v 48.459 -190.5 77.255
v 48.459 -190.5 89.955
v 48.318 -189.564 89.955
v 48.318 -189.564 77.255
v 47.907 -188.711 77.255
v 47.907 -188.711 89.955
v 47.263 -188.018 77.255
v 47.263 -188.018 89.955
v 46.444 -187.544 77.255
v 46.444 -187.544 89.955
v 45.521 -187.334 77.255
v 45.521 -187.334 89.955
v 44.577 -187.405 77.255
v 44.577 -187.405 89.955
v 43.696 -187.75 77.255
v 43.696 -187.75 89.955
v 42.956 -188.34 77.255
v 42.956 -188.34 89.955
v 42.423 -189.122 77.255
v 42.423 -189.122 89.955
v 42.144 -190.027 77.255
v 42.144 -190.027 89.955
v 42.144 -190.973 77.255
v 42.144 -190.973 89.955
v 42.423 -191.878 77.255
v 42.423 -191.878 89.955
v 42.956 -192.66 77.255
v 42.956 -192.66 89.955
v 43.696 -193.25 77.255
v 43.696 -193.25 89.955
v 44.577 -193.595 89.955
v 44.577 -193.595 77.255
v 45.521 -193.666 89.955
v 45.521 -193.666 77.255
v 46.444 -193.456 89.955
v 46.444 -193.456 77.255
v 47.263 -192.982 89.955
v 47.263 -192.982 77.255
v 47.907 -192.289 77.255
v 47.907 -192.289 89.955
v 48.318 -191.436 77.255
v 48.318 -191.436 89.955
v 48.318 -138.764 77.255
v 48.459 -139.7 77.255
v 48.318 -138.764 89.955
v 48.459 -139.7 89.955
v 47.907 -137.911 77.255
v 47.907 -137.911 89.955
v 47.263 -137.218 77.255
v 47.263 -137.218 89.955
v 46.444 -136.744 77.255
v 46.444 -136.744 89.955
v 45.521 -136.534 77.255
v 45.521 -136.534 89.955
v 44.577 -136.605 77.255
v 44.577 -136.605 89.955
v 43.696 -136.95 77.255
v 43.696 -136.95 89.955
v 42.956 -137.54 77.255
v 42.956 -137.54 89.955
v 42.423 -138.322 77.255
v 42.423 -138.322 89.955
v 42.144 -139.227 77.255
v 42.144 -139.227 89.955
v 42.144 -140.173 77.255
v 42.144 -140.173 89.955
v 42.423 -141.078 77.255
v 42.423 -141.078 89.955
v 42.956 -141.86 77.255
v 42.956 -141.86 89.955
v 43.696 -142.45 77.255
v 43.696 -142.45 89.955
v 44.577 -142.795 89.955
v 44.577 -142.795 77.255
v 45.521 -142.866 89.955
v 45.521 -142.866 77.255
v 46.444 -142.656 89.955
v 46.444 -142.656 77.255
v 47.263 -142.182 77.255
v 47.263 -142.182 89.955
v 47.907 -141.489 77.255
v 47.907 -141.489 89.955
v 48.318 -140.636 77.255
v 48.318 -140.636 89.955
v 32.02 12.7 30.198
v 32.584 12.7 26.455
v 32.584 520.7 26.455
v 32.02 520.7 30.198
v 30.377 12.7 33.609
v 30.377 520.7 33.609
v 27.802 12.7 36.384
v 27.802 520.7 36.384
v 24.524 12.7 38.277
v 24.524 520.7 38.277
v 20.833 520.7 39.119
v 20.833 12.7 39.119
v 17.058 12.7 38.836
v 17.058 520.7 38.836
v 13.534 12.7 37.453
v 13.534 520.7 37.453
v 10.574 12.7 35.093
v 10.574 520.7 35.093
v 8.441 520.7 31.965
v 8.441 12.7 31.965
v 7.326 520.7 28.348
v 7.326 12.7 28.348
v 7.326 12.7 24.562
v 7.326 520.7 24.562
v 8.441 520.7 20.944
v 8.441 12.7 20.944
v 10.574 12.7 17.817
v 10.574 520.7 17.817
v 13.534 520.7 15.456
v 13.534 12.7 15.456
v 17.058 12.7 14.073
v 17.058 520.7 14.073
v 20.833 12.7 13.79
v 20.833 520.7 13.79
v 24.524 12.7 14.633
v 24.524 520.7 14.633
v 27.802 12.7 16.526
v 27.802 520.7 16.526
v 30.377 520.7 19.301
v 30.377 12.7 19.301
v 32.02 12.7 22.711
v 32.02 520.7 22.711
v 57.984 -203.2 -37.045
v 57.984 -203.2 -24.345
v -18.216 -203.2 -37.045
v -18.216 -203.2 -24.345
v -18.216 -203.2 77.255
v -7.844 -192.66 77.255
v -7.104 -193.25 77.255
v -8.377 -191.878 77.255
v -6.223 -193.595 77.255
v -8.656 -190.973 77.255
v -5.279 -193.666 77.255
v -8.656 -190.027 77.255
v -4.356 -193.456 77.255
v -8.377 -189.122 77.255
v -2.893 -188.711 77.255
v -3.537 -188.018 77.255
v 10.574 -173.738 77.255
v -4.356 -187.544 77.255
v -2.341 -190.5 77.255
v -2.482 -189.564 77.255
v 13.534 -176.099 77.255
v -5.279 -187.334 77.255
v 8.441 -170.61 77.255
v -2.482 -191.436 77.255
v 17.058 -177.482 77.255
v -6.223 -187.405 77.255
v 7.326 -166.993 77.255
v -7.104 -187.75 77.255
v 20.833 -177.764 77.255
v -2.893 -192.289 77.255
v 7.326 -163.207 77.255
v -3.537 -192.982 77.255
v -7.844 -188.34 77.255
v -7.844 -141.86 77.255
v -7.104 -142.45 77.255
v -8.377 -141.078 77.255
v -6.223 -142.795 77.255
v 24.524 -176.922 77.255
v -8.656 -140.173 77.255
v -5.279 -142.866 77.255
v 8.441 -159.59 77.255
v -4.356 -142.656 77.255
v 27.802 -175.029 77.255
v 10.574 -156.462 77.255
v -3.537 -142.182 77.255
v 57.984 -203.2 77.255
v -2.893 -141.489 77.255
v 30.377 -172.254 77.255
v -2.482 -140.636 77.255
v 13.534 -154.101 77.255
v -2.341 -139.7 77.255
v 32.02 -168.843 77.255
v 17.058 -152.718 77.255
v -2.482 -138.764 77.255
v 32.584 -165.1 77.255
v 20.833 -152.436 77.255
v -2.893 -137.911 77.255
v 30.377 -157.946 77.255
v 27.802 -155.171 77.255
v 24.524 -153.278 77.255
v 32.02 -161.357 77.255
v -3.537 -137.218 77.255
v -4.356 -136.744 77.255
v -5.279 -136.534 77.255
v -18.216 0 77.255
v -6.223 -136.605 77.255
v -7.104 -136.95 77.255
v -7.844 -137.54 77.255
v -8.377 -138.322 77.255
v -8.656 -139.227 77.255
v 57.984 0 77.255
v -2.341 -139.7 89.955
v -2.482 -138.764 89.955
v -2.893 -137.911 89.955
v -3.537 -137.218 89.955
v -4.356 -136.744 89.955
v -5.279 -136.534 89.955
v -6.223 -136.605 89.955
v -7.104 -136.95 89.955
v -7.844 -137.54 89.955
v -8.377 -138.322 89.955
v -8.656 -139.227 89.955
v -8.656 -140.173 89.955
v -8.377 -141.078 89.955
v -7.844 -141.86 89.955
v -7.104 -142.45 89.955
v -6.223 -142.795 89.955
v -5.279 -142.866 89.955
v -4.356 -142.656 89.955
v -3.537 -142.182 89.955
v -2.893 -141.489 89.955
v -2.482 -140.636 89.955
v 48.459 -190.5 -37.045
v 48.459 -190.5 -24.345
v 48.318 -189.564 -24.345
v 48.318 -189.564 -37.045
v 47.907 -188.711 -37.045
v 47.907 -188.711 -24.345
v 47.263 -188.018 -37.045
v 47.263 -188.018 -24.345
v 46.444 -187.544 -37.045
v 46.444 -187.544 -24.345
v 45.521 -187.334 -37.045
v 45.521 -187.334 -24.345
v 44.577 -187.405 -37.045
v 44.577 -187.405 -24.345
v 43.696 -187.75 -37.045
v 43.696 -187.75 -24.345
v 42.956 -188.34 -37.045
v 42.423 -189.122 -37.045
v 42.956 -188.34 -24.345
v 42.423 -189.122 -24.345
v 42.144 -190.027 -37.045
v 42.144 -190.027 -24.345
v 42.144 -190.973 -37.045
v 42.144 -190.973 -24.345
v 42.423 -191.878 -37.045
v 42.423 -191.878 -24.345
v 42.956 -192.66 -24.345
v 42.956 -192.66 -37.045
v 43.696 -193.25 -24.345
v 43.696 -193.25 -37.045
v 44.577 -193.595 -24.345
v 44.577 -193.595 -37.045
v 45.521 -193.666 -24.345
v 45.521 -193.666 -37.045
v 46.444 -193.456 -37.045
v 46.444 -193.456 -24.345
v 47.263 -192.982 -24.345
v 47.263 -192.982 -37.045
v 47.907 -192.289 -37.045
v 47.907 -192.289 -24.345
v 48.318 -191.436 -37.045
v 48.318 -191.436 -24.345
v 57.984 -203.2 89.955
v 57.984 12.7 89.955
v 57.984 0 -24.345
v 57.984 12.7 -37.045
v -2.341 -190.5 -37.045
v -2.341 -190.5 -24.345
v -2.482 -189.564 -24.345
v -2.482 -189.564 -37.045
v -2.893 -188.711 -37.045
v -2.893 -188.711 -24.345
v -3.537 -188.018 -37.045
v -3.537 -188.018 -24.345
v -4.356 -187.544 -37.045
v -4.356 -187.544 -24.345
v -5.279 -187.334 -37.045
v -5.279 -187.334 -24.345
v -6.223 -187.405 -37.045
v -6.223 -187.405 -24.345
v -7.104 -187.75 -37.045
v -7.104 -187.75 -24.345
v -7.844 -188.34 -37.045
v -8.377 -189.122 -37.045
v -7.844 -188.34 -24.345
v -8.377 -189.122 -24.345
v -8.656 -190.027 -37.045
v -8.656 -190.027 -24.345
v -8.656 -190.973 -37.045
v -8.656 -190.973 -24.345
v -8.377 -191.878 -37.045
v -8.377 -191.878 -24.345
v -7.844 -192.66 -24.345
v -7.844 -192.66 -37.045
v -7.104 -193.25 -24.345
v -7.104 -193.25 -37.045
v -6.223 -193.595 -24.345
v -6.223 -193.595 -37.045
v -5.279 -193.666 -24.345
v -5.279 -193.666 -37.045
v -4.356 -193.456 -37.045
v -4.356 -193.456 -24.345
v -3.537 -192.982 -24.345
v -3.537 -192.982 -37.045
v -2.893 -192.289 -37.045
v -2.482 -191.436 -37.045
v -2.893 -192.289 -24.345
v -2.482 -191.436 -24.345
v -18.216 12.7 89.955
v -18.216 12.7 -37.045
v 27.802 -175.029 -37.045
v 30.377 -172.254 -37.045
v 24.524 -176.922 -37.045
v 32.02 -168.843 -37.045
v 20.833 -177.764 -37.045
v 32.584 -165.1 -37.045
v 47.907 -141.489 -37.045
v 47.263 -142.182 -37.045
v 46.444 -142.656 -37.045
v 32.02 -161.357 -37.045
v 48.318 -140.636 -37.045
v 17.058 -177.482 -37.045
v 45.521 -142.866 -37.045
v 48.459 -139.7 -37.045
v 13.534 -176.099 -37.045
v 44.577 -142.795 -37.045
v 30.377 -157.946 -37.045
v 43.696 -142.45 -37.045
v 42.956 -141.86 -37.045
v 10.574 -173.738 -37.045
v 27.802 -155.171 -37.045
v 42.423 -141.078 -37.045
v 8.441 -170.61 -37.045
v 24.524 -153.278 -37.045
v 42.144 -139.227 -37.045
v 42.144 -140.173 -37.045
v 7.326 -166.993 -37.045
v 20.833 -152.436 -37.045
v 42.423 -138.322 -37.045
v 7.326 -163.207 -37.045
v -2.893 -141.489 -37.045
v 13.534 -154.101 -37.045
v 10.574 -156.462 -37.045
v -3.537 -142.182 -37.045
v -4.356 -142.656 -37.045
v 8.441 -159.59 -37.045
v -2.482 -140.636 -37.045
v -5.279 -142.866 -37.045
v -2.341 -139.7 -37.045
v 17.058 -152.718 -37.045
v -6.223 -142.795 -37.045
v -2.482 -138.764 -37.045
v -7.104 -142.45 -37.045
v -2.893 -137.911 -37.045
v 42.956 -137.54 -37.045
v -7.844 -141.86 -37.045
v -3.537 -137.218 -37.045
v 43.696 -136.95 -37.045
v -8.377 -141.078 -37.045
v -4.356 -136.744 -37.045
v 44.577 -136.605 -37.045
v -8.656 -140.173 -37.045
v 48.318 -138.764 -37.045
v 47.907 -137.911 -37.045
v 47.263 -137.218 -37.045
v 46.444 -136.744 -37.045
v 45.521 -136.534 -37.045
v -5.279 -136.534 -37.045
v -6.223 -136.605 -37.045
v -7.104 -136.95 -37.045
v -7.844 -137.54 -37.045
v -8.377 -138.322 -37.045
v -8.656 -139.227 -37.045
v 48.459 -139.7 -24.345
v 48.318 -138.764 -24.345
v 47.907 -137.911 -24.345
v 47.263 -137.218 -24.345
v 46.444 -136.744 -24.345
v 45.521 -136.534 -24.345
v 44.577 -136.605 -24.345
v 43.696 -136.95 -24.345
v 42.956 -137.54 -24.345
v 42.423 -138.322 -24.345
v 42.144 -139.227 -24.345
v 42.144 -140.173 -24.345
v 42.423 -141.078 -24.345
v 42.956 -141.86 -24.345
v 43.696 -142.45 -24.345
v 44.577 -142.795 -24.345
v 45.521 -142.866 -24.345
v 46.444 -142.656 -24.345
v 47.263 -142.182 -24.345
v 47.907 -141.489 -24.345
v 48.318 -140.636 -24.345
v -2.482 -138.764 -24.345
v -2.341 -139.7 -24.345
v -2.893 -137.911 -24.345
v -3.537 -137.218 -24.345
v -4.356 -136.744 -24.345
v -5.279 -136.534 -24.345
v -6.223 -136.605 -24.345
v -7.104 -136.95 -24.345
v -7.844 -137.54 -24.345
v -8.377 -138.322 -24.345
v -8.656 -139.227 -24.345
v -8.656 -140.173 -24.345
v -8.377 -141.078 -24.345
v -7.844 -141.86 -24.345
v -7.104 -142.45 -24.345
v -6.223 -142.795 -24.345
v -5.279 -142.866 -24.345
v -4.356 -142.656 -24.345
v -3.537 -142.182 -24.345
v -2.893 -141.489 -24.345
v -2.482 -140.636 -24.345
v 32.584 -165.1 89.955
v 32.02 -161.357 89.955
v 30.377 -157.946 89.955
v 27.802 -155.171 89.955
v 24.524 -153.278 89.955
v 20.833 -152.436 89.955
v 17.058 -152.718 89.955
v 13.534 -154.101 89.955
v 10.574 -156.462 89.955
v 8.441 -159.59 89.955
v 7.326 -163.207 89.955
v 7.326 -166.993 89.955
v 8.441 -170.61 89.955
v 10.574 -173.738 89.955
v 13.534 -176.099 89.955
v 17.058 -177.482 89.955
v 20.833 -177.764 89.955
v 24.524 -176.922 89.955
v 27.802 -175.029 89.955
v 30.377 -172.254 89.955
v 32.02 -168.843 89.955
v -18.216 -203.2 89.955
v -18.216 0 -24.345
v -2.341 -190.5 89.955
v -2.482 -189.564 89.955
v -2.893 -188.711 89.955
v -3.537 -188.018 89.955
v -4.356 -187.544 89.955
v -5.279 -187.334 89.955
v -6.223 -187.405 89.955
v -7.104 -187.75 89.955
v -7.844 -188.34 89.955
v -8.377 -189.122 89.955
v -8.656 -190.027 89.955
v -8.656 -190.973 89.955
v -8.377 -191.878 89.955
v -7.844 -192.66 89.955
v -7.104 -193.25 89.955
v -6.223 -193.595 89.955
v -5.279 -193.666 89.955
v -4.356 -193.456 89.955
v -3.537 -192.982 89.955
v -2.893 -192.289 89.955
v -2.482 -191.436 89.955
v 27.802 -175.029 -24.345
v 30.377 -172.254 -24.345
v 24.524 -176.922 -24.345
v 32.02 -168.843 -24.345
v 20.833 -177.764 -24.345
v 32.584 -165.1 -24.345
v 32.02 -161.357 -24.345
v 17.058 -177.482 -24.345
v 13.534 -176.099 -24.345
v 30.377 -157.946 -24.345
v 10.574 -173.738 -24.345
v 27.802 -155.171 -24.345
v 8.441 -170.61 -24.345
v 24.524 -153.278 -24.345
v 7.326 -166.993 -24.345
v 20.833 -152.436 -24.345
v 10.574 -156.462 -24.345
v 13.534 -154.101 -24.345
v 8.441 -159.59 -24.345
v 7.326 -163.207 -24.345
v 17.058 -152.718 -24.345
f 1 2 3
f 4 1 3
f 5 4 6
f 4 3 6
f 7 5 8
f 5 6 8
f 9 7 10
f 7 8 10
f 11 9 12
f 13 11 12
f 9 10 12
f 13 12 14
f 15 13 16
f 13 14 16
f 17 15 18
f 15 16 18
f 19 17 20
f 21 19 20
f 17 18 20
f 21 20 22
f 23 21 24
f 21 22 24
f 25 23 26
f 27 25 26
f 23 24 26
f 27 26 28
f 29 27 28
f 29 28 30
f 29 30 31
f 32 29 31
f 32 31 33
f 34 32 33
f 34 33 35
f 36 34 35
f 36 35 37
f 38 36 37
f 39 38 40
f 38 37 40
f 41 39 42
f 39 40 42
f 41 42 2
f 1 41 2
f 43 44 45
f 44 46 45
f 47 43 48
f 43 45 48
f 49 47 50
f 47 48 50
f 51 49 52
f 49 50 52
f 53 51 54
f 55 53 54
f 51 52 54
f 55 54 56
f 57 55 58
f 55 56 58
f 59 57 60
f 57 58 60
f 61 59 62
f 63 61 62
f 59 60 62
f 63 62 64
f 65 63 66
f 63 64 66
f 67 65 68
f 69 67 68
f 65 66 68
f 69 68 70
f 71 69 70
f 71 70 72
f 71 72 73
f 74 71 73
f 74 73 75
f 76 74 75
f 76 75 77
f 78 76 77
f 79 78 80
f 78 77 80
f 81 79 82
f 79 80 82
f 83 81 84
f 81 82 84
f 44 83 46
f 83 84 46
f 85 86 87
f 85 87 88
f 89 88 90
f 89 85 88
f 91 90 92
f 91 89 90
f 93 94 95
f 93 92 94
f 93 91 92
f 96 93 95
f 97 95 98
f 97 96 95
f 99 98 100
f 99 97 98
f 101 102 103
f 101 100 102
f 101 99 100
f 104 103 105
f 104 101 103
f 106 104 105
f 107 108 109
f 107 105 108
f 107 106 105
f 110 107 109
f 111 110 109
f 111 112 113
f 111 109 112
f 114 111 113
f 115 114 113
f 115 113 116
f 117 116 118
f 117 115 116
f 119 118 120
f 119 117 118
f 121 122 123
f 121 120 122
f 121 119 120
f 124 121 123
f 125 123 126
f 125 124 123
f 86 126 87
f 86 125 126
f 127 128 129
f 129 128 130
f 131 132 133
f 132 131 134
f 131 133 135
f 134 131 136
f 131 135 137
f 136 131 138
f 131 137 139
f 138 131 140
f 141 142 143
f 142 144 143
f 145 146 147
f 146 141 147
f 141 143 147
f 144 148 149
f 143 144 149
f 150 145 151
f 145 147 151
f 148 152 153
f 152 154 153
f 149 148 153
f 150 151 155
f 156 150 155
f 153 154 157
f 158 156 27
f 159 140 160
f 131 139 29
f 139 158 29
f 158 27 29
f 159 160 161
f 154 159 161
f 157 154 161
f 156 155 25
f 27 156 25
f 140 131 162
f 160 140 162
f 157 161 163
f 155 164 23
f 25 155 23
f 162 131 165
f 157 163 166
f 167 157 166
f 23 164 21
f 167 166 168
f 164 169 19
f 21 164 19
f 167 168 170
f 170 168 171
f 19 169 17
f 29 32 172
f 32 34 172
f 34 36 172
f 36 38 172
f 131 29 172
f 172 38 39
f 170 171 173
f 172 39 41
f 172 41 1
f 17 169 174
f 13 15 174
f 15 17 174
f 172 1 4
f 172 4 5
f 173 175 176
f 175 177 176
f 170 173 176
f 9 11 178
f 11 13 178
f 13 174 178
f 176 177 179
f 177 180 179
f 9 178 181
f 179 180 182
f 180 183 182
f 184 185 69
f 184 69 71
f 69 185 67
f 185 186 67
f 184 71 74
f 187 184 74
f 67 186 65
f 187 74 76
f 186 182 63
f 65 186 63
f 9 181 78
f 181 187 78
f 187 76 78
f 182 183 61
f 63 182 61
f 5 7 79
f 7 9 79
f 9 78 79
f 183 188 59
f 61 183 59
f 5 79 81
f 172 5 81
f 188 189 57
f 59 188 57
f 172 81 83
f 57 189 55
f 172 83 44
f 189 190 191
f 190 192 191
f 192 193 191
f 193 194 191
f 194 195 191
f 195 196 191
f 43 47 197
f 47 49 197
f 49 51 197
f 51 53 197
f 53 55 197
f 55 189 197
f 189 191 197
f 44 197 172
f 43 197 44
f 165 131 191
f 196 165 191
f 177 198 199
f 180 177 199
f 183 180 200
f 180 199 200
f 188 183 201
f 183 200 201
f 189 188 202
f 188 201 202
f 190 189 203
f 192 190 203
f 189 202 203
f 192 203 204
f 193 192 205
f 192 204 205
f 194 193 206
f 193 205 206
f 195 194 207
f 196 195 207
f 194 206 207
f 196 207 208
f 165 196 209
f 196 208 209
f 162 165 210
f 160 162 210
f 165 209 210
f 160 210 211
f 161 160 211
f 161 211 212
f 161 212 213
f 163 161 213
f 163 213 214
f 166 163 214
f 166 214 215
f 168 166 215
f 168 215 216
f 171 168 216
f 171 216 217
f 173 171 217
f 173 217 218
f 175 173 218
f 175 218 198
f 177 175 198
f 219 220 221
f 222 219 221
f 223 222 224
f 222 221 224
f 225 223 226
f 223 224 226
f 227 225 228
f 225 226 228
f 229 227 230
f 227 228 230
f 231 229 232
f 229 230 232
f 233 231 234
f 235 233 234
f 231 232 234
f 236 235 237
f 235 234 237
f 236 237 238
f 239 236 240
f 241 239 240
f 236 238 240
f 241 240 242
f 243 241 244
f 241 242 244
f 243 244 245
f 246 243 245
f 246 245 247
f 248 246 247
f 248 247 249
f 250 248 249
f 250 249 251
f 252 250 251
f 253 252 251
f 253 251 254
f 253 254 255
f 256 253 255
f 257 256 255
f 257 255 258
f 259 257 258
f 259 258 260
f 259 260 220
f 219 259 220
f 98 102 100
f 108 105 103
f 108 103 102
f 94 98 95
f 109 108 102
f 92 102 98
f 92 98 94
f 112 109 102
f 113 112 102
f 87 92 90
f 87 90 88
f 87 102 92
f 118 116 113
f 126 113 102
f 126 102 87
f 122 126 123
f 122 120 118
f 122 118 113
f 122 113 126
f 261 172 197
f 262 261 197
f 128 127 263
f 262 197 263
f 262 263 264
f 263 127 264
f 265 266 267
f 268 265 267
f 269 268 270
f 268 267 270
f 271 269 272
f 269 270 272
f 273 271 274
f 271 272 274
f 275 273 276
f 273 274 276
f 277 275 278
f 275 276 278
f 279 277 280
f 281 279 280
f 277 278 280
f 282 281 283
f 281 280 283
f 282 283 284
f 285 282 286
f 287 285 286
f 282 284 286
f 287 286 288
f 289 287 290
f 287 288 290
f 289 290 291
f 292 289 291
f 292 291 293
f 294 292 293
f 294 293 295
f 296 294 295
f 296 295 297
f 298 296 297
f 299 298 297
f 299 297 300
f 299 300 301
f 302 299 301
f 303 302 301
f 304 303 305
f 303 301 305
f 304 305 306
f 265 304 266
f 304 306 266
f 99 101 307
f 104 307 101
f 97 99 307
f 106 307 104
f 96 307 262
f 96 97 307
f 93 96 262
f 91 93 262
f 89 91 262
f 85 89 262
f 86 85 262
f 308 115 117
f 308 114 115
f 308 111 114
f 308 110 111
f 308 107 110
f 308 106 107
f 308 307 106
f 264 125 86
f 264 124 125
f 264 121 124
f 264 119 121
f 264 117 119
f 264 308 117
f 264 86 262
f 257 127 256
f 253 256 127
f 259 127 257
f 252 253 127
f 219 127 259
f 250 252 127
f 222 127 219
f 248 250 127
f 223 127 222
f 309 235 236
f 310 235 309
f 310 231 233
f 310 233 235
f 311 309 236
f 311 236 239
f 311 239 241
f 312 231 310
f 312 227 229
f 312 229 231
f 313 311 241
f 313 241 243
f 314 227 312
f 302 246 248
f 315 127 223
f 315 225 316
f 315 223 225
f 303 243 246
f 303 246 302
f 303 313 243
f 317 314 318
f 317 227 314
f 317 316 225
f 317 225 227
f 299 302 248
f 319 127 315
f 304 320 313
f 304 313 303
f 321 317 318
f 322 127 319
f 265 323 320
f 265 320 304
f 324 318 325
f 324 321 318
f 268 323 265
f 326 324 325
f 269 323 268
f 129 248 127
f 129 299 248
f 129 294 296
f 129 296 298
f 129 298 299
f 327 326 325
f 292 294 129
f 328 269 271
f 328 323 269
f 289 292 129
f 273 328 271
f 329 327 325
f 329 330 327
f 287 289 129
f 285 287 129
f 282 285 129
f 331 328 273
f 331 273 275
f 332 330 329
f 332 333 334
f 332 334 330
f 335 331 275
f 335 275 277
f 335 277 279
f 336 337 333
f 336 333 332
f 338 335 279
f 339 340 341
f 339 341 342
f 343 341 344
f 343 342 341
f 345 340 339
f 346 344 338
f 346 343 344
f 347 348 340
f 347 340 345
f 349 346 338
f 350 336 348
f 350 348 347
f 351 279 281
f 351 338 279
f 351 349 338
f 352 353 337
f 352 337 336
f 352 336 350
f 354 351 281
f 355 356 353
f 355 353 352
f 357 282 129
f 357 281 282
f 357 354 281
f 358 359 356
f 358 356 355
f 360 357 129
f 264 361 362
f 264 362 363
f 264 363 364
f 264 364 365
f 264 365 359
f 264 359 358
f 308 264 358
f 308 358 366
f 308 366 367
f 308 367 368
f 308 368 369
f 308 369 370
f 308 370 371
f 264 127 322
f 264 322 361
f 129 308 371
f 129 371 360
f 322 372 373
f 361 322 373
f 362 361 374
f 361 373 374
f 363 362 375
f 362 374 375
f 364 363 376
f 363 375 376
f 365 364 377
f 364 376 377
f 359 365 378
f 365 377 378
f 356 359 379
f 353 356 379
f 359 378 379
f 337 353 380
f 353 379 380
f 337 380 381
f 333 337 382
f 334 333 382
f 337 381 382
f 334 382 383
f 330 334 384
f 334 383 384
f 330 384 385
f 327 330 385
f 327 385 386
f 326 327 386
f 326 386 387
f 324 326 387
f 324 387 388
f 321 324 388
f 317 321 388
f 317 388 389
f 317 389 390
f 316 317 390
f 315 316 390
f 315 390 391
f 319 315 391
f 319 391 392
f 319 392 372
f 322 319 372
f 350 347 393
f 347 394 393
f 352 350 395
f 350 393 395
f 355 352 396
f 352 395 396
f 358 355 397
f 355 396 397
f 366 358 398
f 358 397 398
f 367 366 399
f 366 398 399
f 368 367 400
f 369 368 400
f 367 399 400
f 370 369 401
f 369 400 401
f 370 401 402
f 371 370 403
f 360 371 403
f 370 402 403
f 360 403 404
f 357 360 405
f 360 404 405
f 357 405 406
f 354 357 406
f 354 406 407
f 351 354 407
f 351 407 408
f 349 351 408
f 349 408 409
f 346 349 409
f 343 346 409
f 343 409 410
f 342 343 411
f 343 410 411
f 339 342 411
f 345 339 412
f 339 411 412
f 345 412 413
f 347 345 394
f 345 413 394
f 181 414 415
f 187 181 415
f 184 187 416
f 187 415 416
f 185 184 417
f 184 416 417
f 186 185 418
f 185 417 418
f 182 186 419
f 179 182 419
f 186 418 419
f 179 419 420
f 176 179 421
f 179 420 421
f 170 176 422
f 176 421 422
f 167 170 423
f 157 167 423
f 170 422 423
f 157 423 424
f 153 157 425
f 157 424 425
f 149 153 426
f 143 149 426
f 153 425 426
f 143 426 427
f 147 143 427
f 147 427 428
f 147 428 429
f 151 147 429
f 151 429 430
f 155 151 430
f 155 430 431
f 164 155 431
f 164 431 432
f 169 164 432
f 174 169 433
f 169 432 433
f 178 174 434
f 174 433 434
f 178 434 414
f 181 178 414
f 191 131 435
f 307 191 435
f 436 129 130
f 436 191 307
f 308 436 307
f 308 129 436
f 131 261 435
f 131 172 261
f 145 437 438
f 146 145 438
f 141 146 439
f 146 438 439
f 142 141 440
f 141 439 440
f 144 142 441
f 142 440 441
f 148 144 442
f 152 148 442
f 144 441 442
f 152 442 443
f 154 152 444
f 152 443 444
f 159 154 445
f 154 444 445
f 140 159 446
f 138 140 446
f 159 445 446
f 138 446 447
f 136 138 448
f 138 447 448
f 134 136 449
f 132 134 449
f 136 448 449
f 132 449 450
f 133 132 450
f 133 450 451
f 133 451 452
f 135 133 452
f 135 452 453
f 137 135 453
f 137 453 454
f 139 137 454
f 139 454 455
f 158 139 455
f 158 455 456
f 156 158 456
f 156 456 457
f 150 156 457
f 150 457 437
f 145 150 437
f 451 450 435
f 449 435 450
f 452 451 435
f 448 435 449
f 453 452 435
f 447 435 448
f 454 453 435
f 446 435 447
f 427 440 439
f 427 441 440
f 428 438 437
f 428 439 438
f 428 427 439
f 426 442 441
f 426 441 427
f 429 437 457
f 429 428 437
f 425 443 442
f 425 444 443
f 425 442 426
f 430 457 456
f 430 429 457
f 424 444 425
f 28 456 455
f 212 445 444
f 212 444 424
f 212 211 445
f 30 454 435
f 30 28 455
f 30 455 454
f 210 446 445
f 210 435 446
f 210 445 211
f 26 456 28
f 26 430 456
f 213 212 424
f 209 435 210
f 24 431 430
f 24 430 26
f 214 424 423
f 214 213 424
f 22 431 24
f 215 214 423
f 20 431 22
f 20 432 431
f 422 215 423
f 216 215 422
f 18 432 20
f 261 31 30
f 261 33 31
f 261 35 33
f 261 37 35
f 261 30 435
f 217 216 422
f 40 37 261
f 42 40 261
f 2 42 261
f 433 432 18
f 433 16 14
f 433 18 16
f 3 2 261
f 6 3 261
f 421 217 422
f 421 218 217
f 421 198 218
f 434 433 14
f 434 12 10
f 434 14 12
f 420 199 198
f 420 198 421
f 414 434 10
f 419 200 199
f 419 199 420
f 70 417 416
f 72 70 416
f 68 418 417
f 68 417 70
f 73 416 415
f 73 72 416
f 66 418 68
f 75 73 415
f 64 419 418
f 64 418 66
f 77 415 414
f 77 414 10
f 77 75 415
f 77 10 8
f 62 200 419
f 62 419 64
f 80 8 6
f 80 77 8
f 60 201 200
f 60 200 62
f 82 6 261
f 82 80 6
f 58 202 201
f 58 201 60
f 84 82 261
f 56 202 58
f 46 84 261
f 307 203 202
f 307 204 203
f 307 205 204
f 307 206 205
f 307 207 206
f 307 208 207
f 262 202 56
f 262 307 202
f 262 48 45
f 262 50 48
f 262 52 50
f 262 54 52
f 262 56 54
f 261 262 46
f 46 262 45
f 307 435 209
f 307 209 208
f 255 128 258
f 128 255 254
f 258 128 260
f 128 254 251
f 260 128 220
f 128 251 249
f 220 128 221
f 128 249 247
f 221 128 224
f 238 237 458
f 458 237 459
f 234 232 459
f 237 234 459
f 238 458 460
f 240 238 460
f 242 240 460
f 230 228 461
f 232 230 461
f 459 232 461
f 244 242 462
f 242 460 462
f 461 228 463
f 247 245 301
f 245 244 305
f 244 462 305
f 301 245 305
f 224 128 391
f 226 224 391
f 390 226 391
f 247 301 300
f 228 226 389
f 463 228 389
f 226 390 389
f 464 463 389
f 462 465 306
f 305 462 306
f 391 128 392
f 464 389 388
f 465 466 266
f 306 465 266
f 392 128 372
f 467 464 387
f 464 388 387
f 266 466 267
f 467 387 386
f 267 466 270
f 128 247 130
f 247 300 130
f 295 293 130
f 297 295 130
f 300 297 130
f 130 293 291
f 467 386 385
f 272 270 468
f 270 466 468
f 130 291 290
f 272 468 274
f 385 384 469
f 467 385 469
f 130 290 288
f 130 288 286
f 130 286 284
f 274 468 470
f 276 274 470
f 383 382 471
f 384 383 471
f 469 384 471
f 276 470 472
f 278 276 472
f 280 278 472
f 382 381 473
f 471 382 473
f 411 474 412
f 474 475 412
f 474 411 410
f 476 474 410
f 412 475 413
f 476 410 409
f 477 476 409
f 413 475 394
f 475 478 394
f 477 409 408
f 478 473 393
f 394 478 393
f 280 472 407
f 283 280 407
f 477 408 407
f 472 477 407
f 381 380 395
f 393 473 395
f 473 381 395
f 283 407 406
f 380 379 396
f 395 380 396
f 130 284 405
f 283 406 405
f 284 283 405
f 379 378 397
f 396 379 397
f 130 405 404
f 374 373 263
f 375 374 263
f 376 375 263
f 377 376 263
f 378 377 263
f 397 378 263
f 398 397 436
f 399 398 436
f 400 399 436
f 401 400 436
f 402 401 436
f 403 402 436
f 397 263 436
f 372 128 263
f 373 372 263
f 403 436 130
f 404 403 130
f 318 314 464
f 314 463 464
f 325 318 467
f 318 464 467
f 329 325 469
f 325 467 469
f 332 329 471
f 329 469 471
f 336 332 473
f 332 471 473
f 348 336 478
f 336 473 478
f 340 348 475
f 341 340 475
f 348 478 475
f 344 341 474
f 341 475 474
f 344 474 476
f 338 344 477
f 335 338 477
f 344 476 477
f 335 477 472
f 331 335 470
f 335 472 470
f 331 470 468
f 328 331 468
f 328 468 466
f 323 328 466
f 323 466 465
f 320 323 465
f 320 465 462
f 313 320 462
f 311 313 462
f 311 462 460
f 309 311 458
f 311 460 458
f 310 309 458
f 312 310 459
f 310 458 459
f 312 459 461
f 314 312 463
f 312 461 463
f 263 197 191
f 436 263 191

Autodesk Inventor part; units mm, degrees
ref_plane "YZ Plane" through (0, 0, 0) normal (1, 0, 0) x (0, 1, 0)
ref_plane "XZ Plane" through (0, 0, 0) normal (0, 1, 0) x (-1, 0, 0)
ref_plane "XY Plane" through (0, 0, 0) normal (0, 0, 1) x (1, 0, 0)
sketch "Sketch1" plane through (0, 0, 0) normal (0, 1, 0) x (-1, 0, 0)
  line L0 (18.2162, 77.2548) -> (-57.9838, 77.2548)
  line L1 (-57.9838, 77.2548) -> (-57.9838, -24.3452)
  line L2 (-57.9838, -24.3452) -> (18.2162, -24.3452)
  line L3 (18.2162, -24.3452) -> (18.2162, 77.2548)
  point P0 (0, 0)
  dimension "d0" = 101.6
  dimension "d1" = 76.2
extrude "Extrusion1" add sketch "Sketch1" along normal blind 12.7
sketch "Sketch2" plane through (57.9838, 0, -24.3452) normal (0, 0, -1) x (-1, 0, 0)
  line L0 (0, 0) -> (0, -203.2)
  line L1 (0, -203.2) -> (76.2, -203.2)
  line L2 (0, 0) -> (76.2, 0) projected
  line L3 (76.2, -203.2) -> (76.2, 0)
  line L4 (0, 12.7) -> (76.2, 12.7) projected
  line L5 (0, 0) -> (0, 12.7)
  line L6 (0, 12.7) -> (76.2, 12.7)
  line L7 (76.2, 12.7) -> (76.2, 0)
  point P0 (57.9838, 0)
  dimension "d4" = 90
  dimension "d5" = 203.2
extrude "Extrusion2" add sketch "Sketch2" along normal blind 12.7
sketch "Sketch3" plane through (-18.2162, 0, 77.2548) normal (0, 0, 1) x (1, 0, 0)
  line L0 (0, 0) -> (0, 12.7) projected
  line L1 (0, 0) -> (0, 12.7)
  line L2 (76.2, 0) -> (76.2, 12.7) projected
  line L3 (0, 12.7) -> (76.2, 12.7)
  line L4 (76.2, 12.7) -> (76.2, 0)
  line L5 (76.2, 0) -> (76.2, -203.2) projected
  line L6 (76.2, 0) -> (76.2, -203.2)
  line L7 (76.2, -203.2) -> (0, -203.2) projected
  line L8 (76.2, -203.2) -> (0, -203.2)
  line L9 (0, -203.2) -> (0, 0)
  point P0 (18.2162, 0)
extrude "Extrusion3" add sketch "Sketch3" along normal blind 12.7
sketch "Sketch4" plane through (0, 12.7, 0) normal (0, 1, 0) x (1, 0, 0)
  line L0 (-18.2162, -77.2548) -> (57.9838, -77.2548) construction
  line L1 (-18.2162, 24.3452) -> (-18.2162, -77.2548) construction
  line L2 (57.9838, -77.2548) -> (-18.2162, -77.2548) construction
  line L3 (-18.2162, -77.2548) -> (-18.2162, 24.3452) construction
  line L4 (-18.2162, 24.3452) -> (57.9838, 24.3452) construction
  line L5 (57.9838, 24.3452) -> (57.9838, -77.2548) construction
  line L6 (57.9838, 24.3452) -> (-18.2162, 24.3452) construction
  line L7 (-18.2162, -26.4548) -> (19.8838, -26.4548) construction
  line L8 (19.8838, -26.4548) -> (19.8838, 24.3452) construction
  line L9 (19.8838, 24.3452) -> (-18.2162, 24.3452) construction
  line L10 (-18.2162, 24.3452) -> (-18.2162, -26.4548) construction
  circle A0 centre (19.8838, -26.4548) radius 12.7
  dimension "d27" = 25.4
extrude "Extrusion4" add sketch "Sketch4" along normal blind 508
sketch "Sketch6" plane through (-18.2162, 0, 89.9548) normal (0, 0, 1) x (1, 0, 0)
  line L0 (0, -203.2) -> (76.2, -203.2) construction
  line L1 (38.1, -203.2) -> (76.2, -203.2) construction
  line L2 (76.2, -203.2) -> (76.2, -165.1) construction
  line L3 (76.2, -165.1) -> (38.1, -165.1) construction
  line L4 (38.1, -165.1) -> (38.1, -203.2) construction
  circle A0 centre (38.1, -165.1) radius 12.7
  point P0 (18.2162, 0)
  dimension "d28" = 25.4
extrude "Extrusion6" cut sketch "Sketch6" against normal through all
sketch "Sketch7" plane through (-18.2162, 0, 89.9548) normal (0, 0, 1) x (1, 0, 0)
  circle A0 centre (38.1, -165.1) radius 12.7 construction
  circle A1 centre (38.1, -165.1) radius 157.48 construction
  line L0 (38.1, -322.58) -> (38.1, -203.2) construction
  line L1 (0, -203.2) -> (76.2, -203.2) construction
  line L2 (0, 0) -> (0, -203.2) construction
  line L3 (0, -203.2) -> (38.1, -165.1) construction
  line L4 (76.2, -203.2) -> (76.2, 0) construction
  line L5 (38.1, -165.1) -> (76.2, -203.2) construction
  line L6 (38.1, -165.1) -> (0, -127) construction
  line L7 (38.1, -165.1) -> (76.2, -127) construction
  line L8 (12.7, -139.7) -> (63.5, -139.7) construction
  line L9 (63.5, -139.7) -> (63.5, -190.5) construction
  line L10 (63.5, -190.5) -> (12.7, -190.5) construction
  line L11 (12.7, -190.5) -> (12.7, -139.7) construction
  circle A2 centre (12.7, -139.7) radius 3.175
  circle A3 centre (63.5, -139.7) radius 3.175
  circle A4 centre (63.5, -190.5) radius 3.175
  circle A5 centre (12.7, -190.5) radius 3.175
  point P0 (18.2162, 0)
  dimension "d31" = 314.96
  dimension "d32" = 119.38
  dimension "d33" = 50.8
  dimension "d34" = 6.35
extrude "Extrusion7" cut sketch "Sketch7" against normal through all
properties part number "Big Wheel Mount"
